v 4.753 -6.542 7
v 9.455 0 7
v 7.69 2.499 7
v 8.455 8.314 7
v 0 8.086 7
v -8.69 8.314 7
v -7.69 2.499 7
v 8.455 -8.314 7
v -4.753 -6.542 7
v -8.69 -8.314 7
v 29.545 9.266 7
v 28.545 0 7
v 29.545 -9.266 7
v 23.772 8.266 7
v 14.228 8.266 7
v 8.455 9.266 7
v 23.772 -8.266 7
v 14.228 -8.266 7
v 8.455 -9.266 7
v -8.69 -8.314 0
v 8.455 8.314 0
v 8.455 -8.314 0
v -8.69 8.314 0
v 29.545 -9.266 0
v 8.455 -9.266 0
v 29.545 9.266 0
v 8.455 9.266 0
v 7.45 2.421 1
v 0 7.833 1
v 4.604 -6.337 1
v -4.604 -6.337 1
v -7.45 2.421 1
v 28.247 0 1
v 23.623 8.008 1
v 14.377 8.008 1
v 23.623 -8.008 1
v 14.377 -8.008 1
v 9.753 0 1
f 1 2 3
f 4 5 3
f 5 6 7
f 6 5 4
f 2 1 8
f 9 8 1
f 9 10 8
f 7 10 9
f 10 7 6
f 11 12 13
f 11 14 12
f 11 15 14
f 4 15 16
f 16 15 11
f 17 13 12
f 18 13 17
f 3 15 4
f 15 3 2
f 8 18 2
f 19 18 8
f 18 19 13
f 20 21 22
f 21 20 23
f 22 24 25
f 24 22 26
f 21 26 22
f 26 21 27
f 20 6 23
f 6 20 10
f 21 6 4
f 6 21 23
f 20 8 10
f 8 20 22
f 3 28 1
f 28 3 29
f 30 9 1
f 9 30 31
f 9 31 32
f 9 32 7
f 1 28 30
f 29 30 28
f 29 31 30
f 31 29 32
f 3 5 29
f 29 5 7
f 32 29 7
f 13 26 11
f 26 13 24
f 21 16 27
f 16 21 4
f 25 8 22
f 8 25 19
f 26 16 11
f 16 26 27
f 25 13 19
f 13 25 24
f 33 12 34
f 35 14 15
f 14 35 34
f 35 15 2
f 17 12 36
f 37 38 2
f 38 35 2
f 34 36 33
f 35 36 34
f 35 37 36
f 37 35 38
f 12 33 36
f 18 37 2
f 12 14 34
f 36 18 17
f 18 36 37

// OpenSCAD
// CEB Dome Brick Molds — Frequency 14
// Standard frustum shapes: outer face larger, inner face smaller
// Outer/inner ratio: 0.96875 (R_inner/R_outer = 186.0/192.0)
// Units: inches

// PENTAGON skylight mold (outer edge 8.086", inner edge 7.833")
// MOLD: Pentagon skylight
// Outer edge: 9.506"
// Inner edge: 9.209"
// Depth: 7.00" (6.0" brick + 1.0" margin)
difference() {
  translate([0,0,3.500])
    cube([17.380,16.628,7.000], center=true);
  // Frustum cavity: outer face at top, inner face at bottom
  translate([0,0,1.0])
    hull() {
      linear_extrude(height=0.01) polygon(points=[[0.0000,7.8333],[-7.4499,2.4206],[-4.6043,-6.3372],[4.6043,-6.3372],[7.4499,2.4206]]);
      translate([0,0,6.0]) linear_extrude(height=0.01) polygon(points=[[0.0000,8.0859],[-7.6902,2.4987],[-4.7528,-6.5417],[4.7528,-6.5417],[7.6902,2.4987]]);
    }
}

translate([19, 0, 0]) {
// HEXAGON brick mold (outer edge 9.545", inner edge 9.247")
// MOLD: Hexagon brick
// Outer edge: 9.545"
// Inner edge: 9.247"
// Depth: 7.00" (6.0" brick + 1.0" margin)
difference() {
  translate([0,0,3.500])
    cube([21.090,18.532,7.000], center=true);
  // Frustum cavity: outer face at top, inner face at bottom
  translate([0,0,1.0])
    hull() {
      linear_extrude(height=0.01) polygon(points=[[9.2466,0.0000],[4.6233,8.0078],[-4.6233,8.0078],[-9.2466,0.0000],[-4.6233,-8.0078],[4.6233,-8.0078]]);
      translate([0,0,6.0]) linear_extrude(height=0.01) polygon(points=[[9.5449,0.0000],[4.7724,8.2661],[-4.7724,8.2661],[-9.5449,0.0000],[-4.7724,-8.2661],[4.7724,-8.2661]]);
    }
}
}
